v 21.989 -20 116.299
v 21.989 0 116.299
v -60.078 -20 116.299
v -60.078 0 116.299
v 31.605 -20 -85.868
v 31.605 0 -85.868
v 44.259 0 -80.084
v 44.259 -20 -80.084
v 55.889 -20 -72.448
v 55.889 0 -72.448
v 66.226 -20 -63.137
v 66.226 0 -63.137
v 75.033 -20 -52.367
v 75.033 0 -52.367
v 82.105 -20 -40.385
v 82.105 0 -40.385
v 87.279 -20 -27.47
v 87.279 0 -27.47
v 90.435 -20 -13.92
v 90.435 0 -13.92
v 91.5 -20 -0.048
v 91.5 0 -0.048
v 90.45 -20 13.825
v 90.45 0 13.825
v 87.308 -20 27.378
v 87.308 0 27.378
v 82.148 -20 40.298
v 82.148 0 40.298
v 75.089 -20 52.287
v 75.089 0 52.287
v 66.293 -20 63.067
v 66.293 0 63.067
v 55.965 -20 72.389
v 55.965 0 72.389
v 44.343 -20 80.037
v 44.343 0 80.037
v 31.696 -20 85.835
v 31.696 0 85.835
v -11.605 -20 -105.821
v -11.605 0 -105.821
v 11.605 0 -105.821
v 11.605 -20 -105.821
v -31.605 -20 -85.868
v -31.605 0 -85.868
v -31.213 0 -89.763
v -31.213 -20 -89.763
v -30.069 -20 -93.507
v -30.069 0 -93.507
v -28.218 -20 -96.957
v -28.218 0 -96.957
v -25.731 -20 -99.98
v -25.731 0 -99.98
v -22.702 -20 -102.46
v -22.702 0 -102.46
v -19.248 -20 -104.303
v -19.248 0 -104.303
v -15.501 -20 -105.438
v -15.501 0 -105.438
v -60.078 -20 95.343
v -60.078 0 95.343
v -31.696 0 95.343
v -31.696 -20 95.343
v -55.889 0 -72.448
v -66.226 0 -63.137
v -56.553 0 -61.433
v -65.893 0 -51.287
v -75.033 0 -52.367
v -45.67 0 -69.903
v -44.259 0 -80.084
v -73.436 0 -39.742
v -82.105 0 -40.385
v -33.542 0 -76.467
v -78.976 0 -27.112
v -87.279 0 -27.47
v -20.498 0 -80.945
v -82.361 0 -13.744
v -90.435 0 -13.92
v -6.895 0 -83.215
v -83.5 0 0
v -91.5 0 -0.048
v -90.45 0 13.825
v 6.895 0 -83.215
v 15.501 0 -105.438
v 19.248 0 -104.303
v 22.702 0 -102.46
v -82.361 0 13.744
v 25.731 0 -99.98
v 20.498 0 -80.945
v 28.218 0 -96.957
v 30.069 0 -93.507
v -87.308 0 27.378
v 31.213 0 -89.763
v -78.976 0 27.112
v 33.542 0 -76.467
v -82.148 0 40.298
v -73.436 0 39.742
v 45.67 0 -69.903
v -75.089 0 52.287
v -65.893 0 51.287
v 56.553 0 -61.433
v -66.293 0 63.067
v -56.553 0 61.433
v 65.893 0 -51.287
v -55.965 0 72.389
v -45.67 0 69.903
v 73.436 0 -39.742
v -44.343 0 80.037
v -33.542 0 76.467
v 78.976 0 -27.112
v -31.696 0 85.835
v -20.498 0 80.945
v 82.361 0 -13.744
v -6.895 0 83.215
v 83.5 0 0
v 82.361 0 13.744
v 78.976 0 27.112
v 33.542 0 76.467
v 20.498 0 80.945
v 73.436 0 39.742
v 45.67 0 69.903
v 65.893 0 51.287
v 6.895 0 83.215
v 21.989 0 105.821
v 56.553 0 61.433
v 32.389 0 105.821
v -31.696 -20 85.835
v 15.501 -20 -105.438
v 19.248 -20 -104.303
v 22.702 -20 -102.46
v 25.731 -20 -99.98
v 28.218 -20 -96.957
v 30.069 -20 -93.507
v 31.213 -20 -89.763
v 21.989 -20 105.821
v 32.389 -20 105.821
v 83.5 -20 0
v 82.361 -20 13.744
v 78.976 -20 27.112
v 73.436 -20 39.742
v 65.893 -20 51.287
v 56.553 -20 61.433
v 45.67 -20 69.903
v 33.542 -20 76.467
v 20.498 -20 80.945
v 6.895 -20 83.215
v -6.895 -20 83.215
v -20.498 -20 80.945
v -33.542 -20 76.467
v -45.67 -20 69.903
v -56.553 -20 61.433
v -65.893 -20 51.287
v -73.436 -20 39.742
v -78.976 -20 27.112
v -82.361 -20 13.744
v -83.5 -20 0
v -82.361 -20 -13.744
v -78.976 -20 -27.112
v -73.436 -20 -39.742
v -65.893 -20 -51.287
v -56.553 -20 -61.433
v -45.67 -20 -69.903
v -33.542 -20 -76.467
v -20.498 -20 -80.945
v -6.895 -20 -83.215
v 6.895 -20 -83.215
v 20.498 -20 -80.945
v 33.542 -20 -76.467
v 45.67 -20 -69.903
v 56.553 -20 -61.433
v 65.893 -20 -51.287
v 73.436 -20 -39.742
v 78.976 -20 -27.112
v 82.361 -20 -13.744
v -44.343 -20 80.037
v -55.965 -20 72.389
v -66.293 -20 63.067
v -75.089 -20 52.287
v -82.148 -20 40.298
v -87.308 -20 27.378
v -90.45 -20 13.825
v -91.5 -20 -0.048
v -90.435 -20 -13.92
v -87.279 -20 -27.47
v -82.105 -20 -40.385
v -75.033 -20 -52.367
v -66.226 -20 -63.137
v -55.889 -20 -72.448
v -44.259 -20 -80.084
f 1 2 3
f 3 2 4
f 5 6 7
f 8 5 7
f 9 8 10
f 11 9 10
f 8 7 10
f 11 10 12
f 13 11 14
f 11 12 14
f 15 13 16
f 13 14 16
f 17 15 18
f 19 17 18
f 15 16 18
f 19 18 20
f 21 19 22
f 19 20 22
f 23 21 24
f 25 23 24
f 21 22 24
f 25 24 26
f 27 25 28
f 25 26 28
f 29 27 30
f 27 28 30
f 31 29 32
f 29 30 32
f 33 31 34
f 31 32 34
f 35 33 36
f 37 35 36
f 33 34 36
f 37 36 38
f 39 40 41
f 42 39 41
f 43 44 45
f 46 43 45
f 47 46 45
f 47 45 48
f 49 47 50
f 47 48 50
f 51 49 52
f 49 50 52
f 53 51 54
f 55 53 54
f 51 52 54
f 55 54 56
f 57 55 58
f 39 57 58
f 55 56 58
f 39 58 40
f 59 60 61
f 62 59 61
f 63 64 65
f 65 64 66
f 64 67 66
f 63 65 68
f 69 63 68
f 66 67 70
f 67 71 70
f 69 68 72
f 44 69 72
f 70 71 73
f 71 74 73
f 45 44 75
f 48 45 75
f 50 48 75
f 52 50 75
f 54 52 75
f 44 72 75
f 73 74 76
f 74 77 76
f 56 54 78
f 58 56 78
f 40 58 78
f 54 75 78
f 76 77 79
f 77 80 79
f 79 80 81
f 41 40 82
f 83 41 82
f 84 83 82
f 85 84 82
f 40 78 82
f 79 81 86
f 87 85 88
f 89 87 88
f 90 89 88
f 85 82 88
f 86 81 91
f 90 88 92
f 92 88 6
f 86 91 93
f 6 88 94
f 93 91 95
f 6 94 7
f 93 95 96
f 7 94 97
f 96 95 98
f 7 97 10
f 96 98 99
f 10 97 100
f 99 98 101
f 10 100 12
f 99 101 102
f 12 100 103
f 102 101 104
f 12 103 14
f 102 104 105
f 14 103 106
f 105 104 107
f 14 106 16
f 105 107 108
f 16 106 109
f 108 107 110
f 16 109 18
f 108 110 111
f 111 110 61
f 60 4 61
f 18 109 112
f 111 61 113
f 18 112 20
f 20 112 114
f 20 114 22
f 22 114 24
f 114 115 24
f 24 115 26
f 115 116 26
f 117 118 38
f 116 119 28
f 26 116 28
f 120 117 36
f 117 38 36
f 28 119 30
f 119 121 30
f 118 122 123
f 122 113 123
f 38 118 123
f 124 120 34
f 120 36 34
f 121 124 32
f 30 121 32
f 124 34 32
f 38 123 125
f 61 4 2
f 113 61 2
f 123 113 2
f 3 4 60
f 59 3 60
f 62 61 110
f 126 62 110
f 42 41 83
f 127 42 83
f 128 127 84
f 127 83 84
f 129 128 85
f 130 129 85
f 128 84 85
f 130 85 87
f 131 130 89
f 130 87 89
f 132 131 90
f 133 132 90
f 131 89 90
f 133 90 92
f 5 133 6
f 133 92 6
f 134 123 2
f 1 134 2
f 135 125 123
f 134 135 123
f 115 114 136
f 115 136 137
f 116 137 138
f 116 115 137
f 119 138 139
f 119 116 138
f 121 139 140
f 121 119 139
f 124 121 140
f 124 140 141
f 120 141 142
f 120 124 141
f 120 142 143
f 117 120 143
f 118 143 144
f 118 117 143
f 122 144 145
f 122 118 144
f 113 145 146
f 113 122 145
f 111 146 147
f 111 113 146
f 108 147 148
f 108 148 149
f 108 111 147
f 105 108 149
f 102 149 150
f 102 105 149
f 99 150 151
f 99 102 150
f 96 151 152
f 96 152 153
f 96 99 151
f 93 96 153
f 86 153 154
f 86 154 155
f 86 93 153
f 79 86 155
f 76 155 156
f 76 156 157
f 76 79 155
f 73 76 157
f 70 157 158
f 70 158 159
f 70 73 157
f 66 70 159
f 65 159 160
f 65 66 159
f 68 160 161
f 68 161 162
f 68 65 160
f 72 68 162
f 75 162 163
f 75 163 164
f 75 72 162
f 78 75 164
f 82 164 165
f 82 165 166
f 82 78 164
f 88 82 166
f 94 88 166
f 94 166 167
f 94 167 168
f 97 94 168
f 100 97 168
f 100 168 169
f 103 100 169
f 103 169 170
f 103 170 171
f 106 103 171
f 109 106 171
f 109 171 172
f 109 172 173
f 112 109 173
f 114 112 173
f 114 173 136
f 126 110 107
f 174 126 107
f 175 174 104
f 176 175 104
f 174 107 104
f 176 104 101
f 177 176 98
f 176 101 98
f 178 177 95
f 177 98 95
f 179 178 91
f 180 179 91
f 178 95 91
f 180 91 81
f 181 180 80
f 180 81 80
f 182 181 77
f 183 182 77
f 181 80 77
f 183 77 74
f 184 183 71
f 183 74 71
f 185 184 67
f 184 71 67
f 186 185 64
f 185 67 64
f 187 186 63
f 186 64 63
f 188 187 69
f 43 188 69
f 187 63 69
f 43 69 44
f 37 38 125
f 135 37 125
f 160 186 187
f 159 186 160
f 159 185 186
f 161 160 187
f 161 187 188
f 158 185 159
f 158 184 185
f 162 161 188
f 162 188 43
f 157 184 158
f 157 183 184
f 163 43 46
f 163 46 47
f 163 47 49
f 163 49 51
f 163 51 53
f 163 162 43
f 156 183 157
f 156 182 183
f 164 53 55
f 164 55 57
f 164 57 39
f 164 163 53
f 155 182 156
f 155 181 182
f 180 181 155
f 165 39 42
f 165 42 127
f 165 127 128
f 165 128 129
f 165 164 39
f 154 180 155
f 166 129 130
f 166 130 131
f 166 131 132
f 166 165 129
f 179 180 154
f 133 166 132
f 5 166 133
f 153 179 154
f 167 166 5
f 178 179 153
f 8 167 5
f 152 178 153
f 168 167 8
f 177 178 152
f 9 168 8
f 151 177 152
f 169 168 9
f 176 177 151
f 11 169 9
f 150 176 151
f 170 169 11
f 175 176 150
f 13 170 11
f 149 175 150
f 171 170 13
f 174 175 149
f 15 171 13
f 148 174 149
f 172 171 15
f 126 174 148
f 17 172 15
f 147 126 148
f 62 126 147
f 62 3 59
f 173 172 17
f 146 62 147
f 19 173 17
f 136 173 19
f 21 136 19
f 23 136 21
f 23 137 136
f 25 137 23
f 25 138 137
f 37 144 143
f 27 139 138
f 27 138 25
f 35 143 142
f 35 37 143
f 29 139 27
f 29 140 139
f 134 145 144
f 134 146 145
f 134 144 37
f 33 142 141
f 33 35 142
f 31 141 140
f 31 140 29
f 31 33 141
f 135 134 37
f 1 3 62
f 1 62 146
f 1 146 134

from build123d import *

# Parameters (mm, degrees)
F0_R     = 83.5
F1_DEPTH = 20


with BuildPart() as f1:
    # F0 (on Front) → F1 (new body)
    with BuildSketch(Plane.XZ):
        with BuildLine():
            ThreePointArc((-31.60529, -85.868246), (-25.730746, -99.97979), (-11.605346, -105.820939))
            Line((-11.605346, -105.820939), (11.605346, -105.820939))
            ThreePointArc((11.605346, -105.820939), (25.730746, -99.97979), (31.60529, -85.868246))
            ThreePointArc((31.60529, -85.868246), (91.499987, -0.048384), (31.696085, 85.834773))
            Line((31.696085, 85.834773), (32.388896, 105.820939))
            Line((32.388896, 105.820939), (21.988716, 105.820939))
            Line((21.988716, 105.820939), (21.988716, 116.298988))
            Line((21.988716, 116.298988), (-60.078114, 116.298988))
            Line((-60.078114, 116.298988), (-60.078114, 95.342889))
            Line((-60.078114, 95.342889), (-31.696085, 95.342889))
            Line((-31.696085, 95.342889), (-31.696085, 85.834773))
            ThreePointArc((-31.696085, 85.834773), (-91.499987, -0.048384), (-31.60529, -85.868246))
        make_face()
        Circle(F0_R, mode=Mode.SUBTRACT)
    extrude(amount=F1_DEPTH)


solid = f1.part
